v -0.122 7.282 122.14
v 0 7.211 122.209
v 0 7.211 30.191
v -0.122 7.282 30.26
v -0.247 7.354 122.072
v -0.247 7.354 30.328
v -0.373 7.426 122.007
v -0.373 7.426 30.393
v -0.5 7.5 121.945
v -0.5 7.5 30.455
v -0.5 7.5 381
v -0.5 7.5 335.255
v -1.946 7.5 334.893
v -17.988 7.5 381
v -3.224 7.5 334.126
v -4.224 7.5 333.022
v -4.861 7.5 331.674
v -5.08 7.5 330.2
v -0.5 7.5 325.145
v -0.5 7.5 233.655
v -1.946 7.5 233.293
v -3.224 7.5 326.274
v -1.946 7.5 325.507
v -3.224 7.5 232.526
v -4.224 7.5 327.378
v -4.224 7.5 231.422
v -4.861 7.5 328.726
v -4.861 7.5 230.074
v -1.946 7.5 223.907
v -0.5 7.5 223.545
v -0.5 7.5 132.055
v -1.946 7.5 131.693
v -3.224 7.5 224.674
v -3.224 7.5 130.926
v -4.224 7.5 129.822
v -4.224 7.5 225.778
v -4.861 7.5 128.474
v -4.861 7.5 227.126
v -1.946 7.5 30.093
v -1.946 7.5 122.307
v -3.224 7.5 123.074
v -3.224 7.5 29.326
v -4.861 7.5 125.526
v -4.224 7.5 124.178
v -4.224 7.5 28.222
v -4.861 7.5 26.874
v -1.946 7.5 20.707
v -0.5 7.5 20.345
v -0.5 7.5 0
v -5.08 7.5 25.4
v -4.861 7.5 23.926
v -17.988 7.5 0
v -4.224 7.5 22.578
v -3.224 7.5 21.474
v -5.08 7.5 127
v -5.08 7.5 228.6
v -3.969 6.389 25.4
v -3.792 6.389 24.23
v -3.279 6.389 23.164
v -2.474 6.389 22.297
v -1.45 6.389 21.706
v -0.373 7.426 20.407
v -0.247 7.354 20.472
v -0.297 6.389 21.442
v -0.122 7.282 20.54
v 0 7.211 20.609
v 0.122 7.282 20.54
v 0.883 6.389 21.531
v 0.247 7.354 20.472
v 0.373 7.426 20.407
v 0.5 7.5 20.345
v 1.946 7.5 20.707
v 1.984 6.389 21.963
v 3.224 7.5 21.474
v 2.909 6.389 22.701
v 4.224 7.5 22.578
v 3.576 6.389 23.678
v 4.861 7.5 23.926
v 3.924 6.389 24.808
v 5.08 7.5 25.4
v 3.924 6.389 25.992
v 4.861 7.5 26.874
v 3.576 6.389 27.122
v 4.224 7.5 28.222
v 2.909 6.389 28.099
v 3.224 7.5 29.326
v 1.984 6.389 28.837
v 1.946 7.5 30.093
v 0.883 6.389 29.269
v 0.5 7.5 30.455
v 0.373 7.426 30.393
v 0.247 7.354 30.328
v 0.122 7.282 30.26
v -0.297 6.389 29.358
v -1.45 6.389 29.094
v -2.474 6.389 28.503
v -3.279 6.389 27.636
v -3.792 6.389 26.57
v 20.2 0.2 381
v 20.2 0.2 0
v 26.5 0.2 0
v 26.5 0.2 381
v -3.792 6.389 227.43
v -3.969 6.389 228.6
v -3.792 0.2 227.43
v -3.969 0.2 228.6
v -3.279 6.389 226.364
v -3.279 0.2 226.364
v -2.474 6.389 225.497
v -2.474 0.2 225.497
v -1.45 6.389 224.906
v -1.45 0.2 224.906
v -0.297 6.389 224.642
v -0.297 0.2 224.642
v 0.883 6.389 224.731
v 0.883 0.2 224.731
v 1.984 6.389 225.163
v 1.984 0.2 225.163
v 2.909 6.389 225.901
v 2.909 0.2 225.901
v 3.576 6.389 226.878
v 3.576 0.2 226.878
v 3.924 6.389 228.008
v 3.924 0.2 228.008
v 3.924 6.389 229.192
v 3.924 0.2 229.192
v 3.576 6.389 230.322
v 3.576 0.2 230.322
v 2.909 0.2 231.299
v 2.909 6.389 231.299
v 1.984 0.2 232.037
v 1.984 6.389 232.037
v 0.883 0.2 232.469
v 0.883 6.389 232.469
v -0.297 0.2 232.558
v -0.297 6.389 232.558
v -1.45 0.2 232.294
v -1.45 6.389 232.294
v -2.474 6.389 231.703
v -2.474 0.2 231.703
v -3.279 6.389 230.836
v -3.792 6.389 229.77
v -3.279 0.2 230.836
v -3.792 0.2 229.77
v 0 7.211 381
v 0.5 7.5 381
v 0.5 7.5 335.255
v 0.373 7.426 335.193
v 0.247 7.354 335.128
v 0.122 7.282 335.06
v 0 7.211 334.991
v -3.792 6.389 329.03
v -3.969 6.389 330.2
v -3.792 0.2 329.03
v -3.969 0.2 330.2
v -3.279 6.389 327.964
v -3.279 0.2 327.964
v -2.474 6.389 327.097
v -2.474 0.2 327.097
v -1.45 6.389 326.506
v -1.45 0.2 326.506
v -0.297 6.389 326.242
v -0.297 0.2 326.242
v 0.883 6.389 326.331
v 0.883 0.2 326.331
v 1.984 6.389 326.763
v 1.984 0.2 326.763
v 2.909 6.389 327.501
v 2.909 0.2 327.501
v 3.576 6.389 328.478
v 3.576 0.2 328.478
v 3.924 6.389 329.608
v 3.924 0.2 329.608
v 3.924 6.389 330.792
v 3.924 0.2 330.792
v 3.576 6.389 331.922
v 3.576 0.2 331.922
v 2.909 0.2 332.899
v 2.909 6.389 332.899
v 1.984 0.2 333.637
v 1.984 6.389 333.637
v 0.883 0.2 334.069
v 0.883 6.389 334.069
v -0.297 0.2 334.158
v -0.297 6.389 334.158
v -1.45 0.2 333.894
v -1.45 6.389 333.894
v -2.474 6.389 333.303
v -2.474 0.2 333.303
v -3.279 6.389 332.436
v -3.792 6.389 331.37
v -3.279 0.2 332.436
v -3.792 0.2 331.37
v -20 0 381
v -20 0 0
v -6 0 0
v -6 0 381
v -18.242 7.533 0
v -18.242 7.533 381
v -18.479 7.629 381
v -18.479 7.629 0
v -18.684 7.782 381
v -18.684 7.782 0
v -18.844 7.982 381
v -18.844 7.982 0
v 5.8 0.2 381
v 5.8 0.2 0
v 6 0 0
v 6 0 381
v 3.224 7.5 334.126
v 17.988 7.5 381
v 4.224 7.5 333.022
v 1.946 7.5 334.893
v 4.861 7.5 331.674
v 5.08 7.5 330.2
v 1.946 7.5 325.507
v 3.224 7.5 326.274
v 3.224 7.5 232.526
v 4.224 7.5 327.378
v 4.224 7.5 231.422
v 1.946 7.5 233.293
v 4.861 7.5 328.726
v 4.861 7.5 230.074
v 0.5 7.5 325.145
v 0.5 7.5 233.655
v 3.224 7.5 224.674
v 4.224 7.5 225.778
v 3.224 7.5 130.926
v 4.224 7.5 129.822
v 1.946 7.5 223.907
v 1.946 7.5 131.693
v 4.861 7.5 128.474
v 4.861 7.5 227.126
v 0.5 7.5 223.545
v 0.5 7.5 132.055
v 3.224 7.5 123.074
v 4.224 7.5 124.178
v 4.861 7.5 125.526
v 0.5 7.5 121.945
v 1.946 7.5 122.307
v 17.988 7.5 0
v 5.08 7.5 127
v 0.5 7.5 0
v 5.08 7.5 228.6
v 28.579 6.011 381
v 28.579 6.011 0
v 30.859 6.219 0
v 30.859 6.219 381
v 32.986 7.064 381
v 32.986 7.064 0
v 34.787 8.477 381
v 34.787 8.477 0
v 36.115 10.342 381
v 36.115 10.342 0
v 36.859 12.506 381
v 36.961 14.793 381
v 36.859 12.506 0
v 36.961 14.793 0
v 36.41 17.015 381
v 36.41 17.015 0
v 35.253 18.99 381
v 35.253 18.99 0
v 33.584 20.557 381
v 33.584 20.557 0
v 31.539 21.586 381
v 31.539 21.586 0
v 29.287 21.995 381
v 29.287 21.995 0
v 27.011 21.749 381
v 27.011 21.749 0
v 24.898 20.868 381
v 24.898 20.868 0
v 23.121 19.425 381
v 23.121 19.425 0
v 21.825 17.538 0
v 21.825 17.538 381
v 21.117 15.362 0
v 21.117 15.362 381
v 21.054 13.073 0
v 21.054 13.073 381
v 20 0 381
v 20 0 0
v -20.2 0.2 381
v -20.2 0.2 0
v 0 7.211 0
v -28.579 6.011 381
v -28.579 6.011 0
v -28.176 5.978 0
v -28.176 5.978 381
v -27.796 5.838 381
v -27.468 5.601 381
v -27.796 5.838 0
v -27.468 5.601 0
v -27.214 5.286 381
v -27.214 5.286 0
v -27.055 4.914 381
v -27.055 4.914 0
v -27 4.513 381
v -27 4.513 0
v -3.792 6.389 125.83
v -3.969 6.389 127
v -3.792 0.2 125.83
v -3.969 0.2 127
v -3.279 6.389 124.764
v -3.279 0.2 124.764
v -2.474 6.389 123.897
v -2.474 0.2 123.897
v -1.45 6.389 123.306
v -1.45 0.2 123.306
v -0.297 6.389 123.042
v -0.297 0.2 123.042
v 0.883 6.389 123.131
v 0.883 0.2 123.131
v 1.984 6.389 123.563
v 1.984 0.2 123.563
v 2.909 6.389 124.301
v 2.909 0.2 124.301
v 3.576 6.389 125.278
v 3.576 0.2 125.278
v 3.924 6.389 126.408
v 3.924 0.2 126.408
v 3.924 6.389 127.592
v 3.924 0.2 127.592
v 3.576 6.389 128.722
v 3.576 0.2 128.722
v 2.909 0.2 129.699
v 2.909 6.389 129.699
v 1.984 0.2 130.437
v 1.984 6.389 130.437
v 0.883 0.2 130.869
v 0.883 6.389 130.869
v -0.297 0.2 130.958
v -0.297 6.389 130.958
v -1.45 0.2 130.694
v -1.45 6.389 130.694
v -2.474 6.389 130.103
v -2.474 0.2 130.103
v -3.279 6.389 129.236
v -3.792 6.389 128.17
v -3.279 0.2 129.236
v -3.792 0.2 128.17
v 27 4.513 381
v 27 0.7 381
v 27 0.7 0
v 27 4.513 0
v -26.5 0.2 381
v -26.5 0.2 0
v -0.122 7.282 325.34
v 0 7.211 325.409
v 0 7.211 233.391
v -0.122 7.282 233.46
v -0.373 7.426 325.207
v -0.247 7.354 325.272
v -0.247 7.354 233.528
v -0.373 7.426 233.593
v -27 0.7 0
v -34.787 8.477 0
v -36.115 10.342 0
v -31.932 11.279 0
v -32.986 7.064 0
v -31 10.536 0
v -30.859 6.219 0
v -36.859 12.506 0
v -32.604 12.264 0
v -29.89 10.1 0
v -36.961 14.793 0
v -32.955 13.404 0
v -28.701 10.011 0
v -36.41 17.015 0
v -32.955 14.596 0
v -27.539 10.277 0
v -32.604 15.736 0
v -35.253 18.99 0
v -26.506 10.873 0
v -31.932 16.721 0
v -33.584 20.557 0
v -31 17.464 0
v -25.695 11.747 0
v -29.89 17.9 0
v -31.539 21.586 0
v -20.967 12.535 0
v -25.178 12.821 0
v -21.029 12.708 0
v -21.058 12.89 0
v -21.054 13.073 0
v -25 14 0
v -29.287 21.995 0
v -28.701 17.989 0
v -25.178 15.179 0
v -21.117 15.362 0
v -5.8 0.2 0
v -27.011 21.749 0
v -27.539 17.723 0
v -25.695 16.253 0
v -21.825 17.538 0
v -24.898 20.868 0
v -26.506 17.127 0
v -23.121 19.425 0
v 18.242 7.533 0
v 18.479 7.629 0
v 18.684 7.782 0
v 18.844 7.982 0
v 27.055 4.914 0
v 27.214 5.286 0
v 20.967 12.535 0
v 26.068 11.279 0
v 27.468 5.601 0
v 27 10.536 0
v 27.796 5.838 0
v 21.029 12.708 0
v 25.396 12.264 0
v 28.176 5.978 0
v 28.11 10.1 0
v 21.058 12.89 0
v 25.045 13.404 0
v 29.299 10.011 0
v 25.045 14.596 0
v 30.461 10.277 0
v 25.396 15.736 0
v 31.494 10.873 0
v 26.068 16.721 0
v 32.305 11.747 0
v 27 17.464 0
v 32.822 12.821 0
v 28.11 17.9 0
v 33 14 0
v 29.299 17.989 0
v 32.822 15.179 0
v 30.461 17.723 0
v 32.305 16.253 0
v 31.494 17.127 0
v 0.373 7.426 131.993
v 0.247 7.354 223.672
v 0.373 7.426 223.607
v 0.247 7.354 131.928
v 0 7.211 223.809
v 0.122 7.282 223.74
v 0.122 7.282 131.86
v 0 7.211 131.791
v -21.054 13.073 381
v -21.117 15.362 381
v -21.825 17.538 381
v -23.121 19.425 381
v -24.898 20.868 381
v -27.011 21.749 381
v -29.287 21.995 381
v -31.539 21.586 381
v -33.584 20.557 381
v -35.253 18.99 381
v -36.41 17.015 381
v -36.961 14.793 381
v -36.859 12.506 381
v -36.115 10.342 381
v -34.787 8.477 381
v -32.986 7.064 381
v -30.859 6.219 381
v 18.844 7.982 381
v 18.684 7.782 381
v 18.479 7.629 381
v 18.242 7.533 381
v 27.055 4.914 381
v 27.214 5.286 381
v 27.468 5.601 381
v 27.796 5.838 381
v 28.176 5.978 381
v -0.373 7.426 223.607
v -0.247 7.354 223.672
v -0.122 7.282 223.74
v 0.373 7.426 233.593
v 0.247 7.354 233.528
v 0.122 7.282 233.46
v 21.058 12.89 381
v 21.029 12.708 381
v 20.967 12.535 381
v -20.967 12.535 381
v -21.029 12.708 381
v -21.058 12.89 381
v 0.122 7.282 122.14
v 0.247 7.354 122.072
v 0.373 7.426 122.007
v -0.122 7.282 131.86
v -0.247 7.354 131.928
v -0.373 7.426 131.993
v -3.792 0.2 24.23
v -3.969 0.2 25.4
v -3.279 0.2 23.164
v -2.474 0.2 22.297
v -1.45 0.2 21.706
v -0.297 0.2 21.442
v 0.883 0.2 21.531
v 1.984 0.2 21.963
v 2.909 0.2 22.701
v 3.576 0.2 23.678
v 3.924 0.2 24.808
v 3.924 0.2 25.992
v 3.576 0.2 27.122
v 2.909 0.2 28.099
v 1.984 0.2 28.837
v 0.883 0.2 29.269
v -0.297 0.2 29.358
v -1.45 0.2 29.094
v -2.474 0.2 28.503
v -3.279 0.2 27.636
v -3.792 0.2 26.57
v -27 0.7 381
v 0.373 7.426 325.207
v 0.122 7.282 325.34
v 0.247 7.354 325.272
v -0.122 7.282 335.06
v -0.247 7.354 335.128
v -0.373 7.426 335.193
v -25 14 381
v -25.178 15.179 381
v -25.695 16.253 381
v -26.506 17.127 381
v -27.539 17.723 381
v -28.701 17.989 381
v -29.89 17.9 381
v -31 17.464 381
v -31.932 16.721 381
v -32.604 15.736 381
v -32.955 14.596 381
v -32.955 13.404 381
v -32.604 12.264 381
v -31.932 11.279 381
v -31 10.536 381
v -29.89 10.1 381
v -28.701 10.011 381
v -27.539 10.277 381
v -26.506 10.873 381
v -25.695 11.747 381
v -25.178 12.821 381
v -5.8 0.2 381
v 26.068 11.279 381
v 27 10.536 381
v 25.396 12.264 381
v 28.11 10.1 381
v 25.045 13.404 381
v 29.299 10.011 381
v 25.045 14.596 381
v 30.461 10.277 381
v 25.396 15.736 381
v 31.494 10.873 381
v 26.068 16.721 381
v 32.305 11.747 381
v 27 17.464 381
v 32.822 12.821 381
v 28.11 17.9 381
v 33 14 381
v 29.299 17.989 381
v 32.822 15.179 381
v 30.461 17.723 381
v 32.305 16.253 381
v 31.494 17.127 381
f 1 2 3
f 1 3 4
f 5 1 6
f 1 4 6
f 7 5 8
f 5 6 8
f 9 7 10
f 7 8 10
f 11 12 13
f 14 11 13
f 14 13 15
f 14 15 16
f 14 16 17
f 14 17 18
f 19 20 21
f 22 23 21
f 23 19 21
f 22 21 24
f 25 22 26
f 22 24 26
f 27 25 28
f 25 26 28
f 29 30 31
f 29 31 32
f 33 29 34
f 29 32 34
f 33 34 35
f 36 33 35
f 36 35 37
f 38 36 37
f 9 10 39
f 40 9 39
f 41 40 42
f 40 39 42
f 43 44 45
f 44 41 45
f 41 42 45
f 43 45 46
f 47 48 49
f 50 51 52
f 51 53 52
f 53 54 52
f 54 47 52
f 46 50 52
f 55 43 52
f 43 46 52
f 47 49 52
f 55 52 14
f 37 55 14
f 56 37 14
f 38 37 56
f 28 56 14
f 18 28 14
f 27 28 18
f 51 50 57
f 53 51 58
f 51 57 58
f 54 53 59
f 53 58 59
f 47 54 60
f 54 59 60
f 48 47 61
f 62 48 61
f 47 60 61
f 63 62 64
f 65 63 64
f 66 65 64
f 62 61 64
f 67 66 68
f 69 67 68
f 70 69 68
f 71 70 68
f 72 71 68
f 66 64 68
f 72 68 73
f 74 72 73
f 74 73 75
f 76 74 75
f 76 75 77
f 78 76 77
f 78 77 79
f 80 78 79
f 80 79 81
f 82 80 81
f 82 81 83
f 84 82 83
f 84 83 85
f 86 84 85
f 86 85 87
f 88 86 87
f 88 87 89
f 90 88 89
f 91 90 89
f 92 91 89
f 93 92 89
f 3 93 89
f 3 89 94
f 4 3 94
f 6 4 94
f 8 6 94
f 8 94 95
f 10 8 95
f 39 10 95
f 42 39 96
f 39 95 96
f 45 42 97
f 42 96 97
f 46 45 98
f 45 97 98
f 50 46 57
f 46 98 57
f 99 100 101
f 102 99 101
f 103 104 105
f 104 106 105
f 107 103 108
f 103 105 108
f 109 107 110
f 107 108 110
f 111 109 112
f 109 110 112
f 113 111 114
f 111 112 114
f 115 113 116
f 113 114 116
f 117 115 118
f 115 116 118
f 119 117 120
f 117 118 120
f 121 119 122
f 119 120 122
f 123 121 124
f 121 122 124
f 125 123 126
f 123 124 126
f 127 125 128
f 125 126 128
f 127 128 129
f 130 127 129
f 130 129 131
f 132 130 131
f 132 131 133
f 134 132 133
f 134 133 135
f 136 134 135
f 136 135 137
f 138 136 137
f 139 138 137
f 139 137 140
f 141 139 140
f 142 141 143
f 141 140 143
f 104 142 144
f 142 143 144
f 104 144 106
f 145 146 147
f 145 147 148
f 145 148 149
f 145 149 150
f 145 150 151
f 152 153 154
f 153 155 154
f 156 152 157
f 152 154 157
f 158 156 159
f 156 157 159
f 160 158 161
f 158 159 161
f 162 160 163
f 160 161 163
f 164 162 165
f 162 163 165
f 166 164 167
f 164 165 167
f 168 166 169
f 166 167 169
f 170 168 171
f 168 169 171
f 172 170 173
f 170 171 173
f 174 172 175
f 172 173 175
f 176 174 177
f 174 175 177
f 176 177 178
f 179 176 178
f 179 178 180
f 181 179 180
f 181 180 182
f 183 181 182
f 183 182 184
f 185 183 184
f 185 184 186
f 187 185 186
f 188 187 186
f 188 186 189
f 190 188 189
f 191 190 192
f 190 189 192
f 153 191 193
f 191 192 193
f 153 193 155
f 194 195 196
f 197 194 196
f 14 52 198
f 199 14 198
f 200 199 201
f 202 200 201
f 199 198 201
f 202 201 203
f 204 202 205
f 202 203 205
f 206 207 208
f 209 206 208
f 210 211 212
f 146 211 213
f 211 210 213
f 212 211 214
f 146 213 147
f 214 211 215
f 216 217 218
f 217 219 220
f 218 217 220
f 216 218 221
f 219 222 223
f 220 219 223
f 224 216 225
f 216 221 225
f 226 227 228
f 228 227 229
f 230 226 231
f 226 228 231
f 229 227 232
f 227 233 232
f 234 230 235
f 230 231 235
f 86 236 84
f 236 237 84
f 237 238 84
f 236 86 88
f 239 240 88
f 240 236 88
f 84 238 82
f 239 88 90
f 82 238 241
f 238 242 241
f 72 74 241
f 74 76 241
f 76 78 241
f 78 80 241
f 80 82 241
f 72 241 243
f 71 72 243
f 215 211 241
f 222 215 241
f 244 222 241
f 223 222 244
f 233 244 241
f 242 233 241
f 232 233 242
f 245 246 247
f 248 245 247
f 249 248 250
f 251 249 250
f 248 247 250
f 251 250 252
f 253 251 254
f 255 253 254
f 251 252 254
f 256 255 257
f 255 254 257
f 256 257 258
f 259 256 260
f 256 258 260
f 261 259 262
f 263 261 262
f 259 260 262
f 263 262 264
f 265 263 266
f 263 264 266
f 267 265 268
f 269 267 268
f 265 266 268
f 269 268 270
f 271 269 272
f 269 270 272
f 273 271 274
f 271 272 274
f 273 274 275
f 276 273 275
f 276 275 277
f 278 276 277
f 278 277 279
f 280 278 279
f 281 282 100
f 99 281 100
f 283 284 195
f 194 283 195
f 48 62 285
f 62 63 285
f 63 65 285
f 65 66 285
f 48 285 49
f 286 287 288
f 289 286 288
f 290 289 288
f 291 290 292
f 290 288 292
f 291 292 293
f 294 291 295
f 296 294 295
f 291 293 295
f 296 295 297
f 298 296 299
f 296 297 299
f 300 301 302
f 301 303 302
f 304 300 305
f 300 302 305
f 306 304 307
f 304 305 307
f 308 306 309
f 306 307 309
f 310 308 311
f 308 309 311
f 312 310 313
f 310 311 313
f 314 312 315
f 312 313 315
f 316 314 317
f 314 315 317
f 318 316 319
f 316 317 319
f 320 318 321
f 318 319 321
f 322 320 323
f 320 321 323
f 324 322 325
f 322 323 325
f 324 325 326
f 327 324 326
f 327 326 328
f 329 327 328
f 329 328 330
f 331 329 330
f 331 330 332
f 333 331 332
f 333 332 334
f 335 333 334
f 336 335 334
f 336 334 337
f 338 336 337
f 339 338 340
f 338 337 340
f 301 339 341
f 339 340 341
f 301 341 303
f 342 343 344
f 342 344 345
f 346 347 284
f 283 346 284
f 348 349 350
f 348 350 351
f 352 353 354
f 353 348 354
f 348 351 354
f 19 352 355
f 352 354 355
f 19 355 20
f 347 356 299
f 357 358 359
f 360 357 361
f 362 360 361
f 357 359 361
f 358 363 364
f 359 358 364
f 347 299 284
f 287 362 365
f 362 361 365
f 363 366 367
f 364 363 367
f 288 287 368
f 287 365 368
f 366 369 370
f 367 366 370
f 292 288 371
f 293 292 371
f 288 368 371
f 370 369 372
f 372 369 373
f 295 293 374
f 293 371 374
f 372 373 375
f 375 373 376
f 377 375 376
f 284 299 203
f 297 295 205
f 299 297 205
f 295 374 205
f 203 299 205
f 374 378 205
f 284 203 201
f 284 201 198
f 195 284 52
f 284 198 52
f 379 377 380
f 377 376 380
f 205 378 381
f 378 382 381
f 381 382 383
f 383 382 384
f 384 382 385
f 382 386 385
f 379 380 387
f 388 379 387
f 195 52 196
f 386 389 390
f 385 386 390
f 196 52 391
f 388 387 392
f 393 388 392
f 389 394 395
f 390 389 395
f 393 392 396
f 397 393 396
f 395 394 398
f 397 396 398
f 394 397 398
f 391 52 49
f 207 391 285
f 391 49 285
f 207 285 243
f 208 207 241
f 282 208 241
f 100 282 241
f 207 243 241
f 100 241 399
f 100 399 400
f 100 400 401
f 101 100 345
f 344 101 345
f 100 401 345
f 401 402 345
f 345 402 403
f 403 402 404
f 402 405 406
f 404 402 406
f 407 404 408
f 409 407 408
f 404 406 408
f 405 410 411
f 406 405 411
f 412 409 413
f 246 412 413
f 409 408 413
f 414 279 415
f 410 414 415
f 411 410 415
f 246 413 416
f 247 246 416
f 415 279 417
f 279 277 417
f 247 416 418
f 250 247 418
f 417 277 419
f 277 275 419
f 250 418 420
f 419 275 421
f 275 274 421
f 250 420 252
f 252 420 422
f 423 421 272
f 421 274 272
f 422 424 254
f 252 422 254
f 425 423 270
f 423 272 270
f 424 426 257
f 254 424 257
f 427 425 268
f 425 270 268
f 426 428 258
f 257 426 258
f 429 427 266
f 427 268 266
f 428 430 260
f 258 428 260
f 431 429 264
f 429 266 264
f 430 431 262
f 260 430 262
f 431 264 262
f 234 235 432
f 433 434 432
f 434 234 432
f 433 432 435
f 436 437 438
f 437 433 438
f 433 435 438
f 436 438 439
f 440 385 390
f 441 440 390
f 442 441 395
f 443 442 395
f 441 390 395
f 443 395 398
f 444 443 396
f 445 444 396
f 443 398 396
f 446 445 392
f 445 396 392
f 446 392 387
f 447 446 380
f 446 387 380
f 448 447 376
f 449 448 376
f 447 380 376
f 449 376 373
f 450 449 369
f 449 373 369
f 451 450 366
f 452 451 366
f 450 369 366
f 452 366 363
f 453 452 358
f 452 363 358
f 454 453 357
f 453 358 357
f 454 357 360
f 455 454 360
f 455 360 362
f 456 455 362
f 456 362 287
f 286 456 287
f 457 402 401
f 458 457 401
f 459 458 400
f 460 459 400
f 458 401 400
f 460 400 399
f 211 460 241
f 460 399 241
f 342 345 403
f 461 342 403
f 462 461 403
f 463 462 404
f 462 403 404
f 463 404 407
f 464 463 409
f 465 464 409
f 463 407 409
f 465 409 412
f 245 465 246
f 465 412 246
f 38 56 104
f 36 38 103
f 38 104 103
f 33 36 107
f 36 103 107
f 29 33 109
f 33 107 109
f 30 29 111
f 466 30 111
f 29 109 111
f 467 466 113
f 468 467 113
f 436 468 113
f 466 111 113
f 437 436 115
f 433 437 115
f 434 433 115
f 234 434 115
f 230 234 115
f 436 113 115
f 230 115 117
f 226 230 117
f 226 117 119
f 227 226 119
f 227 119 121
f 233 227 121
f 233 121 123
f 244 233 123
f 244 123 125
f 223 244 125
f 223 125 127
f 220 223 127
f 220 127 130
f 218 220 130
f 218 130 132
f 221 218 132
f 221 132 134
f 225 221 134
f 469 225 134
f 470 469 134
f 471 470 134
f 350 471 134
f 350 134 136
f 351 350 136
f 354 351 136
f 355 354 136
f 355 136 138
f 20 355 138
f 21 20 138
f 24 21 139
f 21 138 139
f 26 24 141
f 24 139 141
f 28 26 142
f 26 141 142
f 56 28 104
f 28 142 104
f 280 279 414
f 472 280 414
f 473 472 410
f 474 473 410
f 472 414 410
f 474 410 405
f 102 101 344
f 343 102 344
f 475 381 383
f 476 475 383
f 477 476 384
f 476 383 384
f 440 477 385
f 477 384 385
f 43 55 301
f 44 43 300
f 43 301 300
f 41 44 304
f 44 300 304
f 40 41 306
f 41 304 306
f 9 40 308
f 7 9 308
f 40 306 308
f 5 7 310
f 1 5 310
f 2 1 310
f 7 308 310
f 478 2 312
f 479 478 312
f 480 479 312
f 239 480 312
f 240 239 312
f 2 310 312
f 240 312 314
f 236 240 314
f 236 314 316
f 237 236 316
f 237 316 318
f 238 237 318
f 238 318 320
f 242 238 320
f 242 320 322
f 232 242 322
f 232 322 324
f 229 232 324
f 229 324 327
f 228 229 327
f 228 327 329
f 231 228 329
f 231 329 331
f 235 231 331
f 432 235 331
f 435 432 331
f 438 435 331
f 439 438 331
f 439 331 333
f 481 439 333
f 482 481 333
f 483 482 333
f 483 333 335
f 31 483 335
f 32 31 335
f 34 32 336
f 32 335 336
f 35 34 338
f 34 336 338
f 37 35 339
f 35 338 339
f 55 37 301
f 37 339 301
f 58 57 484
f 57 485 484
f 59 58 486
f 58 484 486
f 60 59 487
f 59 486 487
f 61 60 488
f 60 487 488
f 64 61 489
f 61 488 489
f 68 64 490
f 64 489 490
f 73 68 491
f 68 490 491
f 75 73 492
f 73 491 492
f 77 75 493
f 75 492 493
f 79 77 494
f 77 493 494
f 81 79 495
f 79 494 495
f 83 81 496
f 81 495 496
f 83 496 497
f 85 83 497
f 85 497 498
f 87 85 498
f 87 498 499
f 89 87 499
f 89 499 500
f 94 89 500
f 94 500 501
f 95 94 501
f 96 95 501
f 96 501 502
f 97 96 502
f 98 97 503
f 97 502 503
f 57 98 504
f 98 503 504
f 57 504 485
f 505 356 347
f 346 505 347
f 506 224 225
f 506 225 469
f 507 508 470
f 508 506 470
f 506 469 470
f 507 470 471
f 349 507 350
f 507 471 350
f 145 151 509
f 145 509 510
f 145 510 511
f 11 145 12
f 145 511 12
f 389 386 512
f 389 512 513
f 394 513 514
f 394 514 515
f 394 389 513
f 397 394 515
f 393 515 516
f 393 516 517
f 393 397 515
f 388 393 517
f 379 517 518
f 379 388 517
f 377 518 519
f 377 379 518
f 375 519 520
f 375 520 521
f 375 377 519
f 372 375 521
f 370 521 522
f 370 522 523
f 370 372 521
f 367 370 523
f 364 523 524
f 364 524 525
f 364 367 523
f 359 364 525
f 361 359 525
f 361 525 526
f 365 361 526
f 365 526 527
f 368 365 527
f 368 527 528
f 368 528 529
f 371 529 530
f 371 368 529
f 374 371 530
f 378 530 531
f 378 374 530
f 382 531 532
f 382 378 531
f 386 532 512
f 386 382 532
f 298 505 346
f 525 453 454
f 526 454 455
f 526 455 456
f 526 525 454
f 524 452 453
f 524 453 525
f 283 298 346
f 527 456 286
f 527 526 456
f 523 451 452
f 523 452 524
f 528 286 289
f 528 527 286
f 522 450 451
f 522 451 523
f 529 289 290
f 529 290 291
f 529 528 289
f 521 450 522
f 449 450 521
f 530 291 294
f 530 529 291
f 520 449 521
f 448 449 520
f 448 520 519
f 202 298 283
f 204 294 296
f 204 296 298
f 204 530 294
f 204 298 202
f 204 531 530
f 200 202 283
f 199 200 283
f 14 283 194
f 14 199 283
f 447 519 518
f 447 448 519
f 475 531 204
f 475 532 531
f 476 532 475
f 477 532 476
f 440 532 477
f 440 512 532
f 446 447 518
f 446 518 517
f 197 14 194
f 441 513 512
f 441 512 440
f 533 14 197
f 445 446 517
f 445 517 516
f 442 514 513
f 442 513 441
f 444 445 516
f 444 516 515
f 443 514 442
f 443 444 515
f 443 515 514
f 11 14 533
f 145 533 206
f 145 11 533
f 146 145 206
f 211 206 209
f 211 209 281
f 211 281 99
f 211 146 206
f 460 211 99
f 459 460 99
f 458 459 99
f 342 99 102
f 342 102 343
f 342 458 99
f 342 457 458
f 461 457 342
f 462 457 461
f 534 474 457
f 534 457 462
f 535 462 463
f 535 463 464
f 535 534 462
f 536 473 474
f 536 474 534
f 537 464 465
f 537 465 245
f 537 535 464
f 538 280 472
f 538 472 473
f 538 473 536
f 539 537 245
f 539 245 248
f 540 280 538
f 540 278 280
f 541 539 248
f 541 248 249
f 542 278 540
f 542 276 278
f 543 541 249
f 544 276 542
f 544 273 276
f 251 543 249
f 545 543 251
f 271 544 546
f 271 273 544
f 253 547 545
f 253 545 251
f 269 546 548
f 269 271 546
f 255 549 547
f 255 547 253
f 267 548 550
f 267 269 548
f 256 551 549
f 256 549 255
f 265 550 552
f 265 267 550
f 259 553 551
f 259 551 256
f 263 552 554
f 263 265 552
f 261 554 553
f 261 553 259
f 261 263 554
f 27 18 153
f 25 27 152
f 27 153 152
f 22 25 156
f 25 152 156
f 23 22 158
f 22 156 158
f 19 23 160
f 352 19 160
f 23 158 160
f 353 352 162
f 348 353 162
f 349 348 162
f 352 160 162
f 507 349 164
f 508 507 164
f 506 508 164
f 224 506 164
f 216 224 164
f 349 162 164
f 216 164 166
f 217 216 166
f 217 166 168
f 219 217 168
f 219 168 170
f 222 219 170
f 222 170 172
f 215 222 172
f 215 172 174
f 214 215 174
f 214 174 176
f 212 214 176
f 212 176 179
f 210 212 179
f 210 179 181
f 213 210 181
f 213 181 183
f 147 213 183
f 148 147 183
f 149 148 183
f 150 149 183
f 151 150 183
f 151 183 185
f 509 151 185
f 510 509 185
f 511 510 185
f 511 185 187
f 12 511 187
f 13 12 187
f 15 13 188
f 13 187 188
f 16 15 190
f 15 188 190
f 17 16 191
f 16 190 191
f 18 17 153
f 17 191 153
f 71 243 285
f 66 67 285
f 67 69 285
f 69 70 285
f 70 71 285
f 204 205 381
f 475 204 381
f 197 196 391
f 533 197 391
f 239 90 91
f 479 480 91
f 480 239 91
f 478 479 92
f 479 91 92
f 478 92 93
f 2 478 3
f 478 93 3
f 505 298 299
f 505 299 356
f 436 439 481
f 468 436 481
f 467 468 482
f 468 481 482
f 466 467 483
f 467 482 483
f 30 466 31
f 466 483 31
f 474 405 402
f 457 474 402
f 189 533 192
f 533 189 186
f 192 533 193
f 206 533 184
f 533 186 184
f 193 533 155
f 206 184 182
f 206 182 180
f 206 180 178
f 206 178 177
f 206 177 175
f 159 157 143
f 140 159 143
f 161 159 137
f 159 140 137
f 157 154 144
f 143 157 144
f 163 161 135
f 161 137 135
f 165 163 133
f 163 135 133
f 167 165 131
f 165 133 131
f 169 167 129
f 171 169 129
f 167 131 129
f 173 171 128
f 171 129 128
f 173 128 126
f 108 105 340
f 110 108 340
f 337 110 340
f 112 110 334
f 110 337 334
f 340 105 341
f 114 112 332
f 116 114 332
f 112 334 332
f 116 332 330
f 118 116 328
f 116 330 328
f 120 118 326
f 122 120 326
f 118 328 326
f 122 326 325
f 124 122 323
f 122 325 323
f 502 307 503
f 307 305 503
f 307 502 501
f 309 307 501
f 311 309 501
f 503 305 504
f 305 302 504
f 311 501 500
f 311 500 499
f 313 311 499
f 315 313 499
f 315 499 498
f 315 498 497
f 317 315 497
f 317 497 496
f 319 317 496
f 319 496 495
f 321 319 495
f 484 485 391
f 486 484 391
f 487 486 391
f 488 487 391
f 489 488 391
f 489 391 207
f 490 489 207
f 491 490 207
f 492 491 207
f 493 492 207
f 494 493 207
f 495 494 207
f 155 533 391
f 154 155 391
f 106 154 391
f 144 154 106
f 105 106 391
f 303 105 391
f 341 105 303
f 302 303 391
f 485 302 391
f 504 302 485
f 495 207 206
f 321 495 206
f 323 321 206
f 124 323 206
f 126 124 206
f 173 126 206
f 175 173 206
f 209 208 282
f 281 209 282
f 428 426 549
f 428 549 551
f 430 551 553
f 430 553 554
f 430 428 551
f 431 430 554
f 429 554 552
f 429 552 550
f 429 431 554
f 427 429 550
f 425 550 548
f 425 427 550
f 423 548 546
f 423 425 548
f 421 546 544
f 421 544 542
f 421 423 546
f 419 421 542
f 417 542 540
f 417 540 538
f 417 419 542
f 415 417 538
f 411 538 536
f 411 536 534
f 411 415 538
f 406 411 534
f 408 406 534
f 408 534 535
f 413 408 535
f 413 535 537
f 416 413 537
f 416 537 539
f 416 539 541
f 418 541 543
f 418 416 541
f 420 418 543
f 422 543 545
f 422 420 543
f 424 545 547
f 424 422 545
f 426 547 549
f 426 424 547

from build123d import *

# Parameters (mm, degrees)
MODEL_R                           = 3.999999997
BOSS_EXTRUDE1_DEPTH               = 381
F_3_8_16_TAPPED_HOLE1_D           = 7.9375
F_3_8_16_TAPPED_HOLE1_CSINK_D     = 10.16
F_3_8_16_TAPPED_HOLE1_CSINK_ANGLE = 90


with BuildPart() as part:
    # Model → Boss-Extrude1 (new body)
    with BuildSketch(Plane.XY):
        with BuildLine():
            Line((-18.843780991, 7.981867858), (-20.966888929, 12.534890876))
            ThreePointArc((-20.966888929, 12.534890876), (-21.047789267, 12.798072701), (-21.053849819, 13.07334131))
            ThreePointArc((-21.053849819, 13.07334131), (-34.474612004, 19.833405747), (-28.578947374, 6.011088019))
            ThreePointArc((-28.578947374, 6.011088019), (-27.4676292, 5.601381399), (-27.000000001, 4.513167022))
            Line((-27.000000001, 4.513167022), (-27.000000001, 0.700000022))
            Line((-27.000000001, 0.700000022), (-26.500000001, 0.200000022))
            Line((-26.500000001, 0.200000022), (-20.200001001, 0.200000022))
            Line((-20.200001001, 0.200000022), (-20.000000979, 0))
            Line((-20.000000979, 0), (-6.000000502, 0))
            Line((-6.000000502, 0), (-5.80000048, 0.200000022))
            Line((-5.80000048, 0.200000022), (5.80000048, 0.200000022))
            Line((5.80000048, 0.200000022), (6.000000502, 0))
            Line((6.000000502, 0), (20.000000979, 0))
            Line((20.000000979, 0), (20.200001001, 0.200000022))
            Line((20.200001001, 0.200000022), (26.500000001, 0.200000022))
            Line((26.500000001, 0.200000022), (27.000000001, 0.700000022))
            Line((27.000000001, 0.700000022), (27.000000001, 4.513167022))
            ThreePointArc((27.000000001, 4.513167022), (27.4676292, 5.601381399), (28.578947374, 6.011088019))
            ThreePointArc((28.578947374, 6.011088019), (34.474612004, 19.833405747), (21.053849819, 13.07334131))
            ThreePointArc((21.053849819, 13.07334131), (21.047789267, 12.798072701), (20.966888929, 12.534890876))
            Line((20.966888929, 12.534890876), (18.843780991, 7.981867858))
            ThreePointArc((18.843780991, 7.981867858), (18.479330527, 7.628755749), (17.98848008, 7.499999621))
            Line((17.98848008, 7.499999621), (0.500000254, 7.499999621))
            Line((0.500000254, 7.499999621), (0, 7.211324621))
            Line((0, 7.211324621), (-0.500000254, 7.499999621))
            Line((-0.500000254, 7.499999621), (-17.98848008, 7.499999621))
            ThreePointArc((-17.98848008, 7.499999621), (-18.479330527, 7.628755749), (-18.843780991, 7.981867858))
        make_face()
        with Locations((-29.000000026, 13.999999962)):
            Circle(MODEL_R, mode=Mode.SUBTRACT)
        with Locations((29.000000026, 13.999999962)):
            Circle(MODEL_R, mode=Mode.SUBTRACT)
    extrude(amount=BOSS_EXTRUDE1_DEPTH)

    # 3/8-16 Tapped Hole1 (through all)
    with Locations(Plane(origin=(0, 7.499999621, 0), x_dir=(1, 0, 0), z_dir=(0, 1, 0))):
        with Locations((0, -25.4), (0, -127), (0, -228.6), (0, -330.2), (0, -431.8), (0, -533.4), (0, -635), (0, -736.6), (0, -838.2), (0, -939.8), (0, -1041.4), (0, -1143), (0, -1244.6), (0, -1346.2), (0, -1447.8), (0, -1549.4), (0, -1651), (0, -1752.6), (0, -1854.2), (0, -1955.8)):
            CounterSinkHole(F_3_8_16_TAPPED_HOLE1_D / 2, F_3_8_16_TAPPED_HOLE1_CSINK_D / 2, counter_sink_angle=F_3_8_16_TAPPED_HOLE1_CSINK_ANGLE)


solid = part.part
